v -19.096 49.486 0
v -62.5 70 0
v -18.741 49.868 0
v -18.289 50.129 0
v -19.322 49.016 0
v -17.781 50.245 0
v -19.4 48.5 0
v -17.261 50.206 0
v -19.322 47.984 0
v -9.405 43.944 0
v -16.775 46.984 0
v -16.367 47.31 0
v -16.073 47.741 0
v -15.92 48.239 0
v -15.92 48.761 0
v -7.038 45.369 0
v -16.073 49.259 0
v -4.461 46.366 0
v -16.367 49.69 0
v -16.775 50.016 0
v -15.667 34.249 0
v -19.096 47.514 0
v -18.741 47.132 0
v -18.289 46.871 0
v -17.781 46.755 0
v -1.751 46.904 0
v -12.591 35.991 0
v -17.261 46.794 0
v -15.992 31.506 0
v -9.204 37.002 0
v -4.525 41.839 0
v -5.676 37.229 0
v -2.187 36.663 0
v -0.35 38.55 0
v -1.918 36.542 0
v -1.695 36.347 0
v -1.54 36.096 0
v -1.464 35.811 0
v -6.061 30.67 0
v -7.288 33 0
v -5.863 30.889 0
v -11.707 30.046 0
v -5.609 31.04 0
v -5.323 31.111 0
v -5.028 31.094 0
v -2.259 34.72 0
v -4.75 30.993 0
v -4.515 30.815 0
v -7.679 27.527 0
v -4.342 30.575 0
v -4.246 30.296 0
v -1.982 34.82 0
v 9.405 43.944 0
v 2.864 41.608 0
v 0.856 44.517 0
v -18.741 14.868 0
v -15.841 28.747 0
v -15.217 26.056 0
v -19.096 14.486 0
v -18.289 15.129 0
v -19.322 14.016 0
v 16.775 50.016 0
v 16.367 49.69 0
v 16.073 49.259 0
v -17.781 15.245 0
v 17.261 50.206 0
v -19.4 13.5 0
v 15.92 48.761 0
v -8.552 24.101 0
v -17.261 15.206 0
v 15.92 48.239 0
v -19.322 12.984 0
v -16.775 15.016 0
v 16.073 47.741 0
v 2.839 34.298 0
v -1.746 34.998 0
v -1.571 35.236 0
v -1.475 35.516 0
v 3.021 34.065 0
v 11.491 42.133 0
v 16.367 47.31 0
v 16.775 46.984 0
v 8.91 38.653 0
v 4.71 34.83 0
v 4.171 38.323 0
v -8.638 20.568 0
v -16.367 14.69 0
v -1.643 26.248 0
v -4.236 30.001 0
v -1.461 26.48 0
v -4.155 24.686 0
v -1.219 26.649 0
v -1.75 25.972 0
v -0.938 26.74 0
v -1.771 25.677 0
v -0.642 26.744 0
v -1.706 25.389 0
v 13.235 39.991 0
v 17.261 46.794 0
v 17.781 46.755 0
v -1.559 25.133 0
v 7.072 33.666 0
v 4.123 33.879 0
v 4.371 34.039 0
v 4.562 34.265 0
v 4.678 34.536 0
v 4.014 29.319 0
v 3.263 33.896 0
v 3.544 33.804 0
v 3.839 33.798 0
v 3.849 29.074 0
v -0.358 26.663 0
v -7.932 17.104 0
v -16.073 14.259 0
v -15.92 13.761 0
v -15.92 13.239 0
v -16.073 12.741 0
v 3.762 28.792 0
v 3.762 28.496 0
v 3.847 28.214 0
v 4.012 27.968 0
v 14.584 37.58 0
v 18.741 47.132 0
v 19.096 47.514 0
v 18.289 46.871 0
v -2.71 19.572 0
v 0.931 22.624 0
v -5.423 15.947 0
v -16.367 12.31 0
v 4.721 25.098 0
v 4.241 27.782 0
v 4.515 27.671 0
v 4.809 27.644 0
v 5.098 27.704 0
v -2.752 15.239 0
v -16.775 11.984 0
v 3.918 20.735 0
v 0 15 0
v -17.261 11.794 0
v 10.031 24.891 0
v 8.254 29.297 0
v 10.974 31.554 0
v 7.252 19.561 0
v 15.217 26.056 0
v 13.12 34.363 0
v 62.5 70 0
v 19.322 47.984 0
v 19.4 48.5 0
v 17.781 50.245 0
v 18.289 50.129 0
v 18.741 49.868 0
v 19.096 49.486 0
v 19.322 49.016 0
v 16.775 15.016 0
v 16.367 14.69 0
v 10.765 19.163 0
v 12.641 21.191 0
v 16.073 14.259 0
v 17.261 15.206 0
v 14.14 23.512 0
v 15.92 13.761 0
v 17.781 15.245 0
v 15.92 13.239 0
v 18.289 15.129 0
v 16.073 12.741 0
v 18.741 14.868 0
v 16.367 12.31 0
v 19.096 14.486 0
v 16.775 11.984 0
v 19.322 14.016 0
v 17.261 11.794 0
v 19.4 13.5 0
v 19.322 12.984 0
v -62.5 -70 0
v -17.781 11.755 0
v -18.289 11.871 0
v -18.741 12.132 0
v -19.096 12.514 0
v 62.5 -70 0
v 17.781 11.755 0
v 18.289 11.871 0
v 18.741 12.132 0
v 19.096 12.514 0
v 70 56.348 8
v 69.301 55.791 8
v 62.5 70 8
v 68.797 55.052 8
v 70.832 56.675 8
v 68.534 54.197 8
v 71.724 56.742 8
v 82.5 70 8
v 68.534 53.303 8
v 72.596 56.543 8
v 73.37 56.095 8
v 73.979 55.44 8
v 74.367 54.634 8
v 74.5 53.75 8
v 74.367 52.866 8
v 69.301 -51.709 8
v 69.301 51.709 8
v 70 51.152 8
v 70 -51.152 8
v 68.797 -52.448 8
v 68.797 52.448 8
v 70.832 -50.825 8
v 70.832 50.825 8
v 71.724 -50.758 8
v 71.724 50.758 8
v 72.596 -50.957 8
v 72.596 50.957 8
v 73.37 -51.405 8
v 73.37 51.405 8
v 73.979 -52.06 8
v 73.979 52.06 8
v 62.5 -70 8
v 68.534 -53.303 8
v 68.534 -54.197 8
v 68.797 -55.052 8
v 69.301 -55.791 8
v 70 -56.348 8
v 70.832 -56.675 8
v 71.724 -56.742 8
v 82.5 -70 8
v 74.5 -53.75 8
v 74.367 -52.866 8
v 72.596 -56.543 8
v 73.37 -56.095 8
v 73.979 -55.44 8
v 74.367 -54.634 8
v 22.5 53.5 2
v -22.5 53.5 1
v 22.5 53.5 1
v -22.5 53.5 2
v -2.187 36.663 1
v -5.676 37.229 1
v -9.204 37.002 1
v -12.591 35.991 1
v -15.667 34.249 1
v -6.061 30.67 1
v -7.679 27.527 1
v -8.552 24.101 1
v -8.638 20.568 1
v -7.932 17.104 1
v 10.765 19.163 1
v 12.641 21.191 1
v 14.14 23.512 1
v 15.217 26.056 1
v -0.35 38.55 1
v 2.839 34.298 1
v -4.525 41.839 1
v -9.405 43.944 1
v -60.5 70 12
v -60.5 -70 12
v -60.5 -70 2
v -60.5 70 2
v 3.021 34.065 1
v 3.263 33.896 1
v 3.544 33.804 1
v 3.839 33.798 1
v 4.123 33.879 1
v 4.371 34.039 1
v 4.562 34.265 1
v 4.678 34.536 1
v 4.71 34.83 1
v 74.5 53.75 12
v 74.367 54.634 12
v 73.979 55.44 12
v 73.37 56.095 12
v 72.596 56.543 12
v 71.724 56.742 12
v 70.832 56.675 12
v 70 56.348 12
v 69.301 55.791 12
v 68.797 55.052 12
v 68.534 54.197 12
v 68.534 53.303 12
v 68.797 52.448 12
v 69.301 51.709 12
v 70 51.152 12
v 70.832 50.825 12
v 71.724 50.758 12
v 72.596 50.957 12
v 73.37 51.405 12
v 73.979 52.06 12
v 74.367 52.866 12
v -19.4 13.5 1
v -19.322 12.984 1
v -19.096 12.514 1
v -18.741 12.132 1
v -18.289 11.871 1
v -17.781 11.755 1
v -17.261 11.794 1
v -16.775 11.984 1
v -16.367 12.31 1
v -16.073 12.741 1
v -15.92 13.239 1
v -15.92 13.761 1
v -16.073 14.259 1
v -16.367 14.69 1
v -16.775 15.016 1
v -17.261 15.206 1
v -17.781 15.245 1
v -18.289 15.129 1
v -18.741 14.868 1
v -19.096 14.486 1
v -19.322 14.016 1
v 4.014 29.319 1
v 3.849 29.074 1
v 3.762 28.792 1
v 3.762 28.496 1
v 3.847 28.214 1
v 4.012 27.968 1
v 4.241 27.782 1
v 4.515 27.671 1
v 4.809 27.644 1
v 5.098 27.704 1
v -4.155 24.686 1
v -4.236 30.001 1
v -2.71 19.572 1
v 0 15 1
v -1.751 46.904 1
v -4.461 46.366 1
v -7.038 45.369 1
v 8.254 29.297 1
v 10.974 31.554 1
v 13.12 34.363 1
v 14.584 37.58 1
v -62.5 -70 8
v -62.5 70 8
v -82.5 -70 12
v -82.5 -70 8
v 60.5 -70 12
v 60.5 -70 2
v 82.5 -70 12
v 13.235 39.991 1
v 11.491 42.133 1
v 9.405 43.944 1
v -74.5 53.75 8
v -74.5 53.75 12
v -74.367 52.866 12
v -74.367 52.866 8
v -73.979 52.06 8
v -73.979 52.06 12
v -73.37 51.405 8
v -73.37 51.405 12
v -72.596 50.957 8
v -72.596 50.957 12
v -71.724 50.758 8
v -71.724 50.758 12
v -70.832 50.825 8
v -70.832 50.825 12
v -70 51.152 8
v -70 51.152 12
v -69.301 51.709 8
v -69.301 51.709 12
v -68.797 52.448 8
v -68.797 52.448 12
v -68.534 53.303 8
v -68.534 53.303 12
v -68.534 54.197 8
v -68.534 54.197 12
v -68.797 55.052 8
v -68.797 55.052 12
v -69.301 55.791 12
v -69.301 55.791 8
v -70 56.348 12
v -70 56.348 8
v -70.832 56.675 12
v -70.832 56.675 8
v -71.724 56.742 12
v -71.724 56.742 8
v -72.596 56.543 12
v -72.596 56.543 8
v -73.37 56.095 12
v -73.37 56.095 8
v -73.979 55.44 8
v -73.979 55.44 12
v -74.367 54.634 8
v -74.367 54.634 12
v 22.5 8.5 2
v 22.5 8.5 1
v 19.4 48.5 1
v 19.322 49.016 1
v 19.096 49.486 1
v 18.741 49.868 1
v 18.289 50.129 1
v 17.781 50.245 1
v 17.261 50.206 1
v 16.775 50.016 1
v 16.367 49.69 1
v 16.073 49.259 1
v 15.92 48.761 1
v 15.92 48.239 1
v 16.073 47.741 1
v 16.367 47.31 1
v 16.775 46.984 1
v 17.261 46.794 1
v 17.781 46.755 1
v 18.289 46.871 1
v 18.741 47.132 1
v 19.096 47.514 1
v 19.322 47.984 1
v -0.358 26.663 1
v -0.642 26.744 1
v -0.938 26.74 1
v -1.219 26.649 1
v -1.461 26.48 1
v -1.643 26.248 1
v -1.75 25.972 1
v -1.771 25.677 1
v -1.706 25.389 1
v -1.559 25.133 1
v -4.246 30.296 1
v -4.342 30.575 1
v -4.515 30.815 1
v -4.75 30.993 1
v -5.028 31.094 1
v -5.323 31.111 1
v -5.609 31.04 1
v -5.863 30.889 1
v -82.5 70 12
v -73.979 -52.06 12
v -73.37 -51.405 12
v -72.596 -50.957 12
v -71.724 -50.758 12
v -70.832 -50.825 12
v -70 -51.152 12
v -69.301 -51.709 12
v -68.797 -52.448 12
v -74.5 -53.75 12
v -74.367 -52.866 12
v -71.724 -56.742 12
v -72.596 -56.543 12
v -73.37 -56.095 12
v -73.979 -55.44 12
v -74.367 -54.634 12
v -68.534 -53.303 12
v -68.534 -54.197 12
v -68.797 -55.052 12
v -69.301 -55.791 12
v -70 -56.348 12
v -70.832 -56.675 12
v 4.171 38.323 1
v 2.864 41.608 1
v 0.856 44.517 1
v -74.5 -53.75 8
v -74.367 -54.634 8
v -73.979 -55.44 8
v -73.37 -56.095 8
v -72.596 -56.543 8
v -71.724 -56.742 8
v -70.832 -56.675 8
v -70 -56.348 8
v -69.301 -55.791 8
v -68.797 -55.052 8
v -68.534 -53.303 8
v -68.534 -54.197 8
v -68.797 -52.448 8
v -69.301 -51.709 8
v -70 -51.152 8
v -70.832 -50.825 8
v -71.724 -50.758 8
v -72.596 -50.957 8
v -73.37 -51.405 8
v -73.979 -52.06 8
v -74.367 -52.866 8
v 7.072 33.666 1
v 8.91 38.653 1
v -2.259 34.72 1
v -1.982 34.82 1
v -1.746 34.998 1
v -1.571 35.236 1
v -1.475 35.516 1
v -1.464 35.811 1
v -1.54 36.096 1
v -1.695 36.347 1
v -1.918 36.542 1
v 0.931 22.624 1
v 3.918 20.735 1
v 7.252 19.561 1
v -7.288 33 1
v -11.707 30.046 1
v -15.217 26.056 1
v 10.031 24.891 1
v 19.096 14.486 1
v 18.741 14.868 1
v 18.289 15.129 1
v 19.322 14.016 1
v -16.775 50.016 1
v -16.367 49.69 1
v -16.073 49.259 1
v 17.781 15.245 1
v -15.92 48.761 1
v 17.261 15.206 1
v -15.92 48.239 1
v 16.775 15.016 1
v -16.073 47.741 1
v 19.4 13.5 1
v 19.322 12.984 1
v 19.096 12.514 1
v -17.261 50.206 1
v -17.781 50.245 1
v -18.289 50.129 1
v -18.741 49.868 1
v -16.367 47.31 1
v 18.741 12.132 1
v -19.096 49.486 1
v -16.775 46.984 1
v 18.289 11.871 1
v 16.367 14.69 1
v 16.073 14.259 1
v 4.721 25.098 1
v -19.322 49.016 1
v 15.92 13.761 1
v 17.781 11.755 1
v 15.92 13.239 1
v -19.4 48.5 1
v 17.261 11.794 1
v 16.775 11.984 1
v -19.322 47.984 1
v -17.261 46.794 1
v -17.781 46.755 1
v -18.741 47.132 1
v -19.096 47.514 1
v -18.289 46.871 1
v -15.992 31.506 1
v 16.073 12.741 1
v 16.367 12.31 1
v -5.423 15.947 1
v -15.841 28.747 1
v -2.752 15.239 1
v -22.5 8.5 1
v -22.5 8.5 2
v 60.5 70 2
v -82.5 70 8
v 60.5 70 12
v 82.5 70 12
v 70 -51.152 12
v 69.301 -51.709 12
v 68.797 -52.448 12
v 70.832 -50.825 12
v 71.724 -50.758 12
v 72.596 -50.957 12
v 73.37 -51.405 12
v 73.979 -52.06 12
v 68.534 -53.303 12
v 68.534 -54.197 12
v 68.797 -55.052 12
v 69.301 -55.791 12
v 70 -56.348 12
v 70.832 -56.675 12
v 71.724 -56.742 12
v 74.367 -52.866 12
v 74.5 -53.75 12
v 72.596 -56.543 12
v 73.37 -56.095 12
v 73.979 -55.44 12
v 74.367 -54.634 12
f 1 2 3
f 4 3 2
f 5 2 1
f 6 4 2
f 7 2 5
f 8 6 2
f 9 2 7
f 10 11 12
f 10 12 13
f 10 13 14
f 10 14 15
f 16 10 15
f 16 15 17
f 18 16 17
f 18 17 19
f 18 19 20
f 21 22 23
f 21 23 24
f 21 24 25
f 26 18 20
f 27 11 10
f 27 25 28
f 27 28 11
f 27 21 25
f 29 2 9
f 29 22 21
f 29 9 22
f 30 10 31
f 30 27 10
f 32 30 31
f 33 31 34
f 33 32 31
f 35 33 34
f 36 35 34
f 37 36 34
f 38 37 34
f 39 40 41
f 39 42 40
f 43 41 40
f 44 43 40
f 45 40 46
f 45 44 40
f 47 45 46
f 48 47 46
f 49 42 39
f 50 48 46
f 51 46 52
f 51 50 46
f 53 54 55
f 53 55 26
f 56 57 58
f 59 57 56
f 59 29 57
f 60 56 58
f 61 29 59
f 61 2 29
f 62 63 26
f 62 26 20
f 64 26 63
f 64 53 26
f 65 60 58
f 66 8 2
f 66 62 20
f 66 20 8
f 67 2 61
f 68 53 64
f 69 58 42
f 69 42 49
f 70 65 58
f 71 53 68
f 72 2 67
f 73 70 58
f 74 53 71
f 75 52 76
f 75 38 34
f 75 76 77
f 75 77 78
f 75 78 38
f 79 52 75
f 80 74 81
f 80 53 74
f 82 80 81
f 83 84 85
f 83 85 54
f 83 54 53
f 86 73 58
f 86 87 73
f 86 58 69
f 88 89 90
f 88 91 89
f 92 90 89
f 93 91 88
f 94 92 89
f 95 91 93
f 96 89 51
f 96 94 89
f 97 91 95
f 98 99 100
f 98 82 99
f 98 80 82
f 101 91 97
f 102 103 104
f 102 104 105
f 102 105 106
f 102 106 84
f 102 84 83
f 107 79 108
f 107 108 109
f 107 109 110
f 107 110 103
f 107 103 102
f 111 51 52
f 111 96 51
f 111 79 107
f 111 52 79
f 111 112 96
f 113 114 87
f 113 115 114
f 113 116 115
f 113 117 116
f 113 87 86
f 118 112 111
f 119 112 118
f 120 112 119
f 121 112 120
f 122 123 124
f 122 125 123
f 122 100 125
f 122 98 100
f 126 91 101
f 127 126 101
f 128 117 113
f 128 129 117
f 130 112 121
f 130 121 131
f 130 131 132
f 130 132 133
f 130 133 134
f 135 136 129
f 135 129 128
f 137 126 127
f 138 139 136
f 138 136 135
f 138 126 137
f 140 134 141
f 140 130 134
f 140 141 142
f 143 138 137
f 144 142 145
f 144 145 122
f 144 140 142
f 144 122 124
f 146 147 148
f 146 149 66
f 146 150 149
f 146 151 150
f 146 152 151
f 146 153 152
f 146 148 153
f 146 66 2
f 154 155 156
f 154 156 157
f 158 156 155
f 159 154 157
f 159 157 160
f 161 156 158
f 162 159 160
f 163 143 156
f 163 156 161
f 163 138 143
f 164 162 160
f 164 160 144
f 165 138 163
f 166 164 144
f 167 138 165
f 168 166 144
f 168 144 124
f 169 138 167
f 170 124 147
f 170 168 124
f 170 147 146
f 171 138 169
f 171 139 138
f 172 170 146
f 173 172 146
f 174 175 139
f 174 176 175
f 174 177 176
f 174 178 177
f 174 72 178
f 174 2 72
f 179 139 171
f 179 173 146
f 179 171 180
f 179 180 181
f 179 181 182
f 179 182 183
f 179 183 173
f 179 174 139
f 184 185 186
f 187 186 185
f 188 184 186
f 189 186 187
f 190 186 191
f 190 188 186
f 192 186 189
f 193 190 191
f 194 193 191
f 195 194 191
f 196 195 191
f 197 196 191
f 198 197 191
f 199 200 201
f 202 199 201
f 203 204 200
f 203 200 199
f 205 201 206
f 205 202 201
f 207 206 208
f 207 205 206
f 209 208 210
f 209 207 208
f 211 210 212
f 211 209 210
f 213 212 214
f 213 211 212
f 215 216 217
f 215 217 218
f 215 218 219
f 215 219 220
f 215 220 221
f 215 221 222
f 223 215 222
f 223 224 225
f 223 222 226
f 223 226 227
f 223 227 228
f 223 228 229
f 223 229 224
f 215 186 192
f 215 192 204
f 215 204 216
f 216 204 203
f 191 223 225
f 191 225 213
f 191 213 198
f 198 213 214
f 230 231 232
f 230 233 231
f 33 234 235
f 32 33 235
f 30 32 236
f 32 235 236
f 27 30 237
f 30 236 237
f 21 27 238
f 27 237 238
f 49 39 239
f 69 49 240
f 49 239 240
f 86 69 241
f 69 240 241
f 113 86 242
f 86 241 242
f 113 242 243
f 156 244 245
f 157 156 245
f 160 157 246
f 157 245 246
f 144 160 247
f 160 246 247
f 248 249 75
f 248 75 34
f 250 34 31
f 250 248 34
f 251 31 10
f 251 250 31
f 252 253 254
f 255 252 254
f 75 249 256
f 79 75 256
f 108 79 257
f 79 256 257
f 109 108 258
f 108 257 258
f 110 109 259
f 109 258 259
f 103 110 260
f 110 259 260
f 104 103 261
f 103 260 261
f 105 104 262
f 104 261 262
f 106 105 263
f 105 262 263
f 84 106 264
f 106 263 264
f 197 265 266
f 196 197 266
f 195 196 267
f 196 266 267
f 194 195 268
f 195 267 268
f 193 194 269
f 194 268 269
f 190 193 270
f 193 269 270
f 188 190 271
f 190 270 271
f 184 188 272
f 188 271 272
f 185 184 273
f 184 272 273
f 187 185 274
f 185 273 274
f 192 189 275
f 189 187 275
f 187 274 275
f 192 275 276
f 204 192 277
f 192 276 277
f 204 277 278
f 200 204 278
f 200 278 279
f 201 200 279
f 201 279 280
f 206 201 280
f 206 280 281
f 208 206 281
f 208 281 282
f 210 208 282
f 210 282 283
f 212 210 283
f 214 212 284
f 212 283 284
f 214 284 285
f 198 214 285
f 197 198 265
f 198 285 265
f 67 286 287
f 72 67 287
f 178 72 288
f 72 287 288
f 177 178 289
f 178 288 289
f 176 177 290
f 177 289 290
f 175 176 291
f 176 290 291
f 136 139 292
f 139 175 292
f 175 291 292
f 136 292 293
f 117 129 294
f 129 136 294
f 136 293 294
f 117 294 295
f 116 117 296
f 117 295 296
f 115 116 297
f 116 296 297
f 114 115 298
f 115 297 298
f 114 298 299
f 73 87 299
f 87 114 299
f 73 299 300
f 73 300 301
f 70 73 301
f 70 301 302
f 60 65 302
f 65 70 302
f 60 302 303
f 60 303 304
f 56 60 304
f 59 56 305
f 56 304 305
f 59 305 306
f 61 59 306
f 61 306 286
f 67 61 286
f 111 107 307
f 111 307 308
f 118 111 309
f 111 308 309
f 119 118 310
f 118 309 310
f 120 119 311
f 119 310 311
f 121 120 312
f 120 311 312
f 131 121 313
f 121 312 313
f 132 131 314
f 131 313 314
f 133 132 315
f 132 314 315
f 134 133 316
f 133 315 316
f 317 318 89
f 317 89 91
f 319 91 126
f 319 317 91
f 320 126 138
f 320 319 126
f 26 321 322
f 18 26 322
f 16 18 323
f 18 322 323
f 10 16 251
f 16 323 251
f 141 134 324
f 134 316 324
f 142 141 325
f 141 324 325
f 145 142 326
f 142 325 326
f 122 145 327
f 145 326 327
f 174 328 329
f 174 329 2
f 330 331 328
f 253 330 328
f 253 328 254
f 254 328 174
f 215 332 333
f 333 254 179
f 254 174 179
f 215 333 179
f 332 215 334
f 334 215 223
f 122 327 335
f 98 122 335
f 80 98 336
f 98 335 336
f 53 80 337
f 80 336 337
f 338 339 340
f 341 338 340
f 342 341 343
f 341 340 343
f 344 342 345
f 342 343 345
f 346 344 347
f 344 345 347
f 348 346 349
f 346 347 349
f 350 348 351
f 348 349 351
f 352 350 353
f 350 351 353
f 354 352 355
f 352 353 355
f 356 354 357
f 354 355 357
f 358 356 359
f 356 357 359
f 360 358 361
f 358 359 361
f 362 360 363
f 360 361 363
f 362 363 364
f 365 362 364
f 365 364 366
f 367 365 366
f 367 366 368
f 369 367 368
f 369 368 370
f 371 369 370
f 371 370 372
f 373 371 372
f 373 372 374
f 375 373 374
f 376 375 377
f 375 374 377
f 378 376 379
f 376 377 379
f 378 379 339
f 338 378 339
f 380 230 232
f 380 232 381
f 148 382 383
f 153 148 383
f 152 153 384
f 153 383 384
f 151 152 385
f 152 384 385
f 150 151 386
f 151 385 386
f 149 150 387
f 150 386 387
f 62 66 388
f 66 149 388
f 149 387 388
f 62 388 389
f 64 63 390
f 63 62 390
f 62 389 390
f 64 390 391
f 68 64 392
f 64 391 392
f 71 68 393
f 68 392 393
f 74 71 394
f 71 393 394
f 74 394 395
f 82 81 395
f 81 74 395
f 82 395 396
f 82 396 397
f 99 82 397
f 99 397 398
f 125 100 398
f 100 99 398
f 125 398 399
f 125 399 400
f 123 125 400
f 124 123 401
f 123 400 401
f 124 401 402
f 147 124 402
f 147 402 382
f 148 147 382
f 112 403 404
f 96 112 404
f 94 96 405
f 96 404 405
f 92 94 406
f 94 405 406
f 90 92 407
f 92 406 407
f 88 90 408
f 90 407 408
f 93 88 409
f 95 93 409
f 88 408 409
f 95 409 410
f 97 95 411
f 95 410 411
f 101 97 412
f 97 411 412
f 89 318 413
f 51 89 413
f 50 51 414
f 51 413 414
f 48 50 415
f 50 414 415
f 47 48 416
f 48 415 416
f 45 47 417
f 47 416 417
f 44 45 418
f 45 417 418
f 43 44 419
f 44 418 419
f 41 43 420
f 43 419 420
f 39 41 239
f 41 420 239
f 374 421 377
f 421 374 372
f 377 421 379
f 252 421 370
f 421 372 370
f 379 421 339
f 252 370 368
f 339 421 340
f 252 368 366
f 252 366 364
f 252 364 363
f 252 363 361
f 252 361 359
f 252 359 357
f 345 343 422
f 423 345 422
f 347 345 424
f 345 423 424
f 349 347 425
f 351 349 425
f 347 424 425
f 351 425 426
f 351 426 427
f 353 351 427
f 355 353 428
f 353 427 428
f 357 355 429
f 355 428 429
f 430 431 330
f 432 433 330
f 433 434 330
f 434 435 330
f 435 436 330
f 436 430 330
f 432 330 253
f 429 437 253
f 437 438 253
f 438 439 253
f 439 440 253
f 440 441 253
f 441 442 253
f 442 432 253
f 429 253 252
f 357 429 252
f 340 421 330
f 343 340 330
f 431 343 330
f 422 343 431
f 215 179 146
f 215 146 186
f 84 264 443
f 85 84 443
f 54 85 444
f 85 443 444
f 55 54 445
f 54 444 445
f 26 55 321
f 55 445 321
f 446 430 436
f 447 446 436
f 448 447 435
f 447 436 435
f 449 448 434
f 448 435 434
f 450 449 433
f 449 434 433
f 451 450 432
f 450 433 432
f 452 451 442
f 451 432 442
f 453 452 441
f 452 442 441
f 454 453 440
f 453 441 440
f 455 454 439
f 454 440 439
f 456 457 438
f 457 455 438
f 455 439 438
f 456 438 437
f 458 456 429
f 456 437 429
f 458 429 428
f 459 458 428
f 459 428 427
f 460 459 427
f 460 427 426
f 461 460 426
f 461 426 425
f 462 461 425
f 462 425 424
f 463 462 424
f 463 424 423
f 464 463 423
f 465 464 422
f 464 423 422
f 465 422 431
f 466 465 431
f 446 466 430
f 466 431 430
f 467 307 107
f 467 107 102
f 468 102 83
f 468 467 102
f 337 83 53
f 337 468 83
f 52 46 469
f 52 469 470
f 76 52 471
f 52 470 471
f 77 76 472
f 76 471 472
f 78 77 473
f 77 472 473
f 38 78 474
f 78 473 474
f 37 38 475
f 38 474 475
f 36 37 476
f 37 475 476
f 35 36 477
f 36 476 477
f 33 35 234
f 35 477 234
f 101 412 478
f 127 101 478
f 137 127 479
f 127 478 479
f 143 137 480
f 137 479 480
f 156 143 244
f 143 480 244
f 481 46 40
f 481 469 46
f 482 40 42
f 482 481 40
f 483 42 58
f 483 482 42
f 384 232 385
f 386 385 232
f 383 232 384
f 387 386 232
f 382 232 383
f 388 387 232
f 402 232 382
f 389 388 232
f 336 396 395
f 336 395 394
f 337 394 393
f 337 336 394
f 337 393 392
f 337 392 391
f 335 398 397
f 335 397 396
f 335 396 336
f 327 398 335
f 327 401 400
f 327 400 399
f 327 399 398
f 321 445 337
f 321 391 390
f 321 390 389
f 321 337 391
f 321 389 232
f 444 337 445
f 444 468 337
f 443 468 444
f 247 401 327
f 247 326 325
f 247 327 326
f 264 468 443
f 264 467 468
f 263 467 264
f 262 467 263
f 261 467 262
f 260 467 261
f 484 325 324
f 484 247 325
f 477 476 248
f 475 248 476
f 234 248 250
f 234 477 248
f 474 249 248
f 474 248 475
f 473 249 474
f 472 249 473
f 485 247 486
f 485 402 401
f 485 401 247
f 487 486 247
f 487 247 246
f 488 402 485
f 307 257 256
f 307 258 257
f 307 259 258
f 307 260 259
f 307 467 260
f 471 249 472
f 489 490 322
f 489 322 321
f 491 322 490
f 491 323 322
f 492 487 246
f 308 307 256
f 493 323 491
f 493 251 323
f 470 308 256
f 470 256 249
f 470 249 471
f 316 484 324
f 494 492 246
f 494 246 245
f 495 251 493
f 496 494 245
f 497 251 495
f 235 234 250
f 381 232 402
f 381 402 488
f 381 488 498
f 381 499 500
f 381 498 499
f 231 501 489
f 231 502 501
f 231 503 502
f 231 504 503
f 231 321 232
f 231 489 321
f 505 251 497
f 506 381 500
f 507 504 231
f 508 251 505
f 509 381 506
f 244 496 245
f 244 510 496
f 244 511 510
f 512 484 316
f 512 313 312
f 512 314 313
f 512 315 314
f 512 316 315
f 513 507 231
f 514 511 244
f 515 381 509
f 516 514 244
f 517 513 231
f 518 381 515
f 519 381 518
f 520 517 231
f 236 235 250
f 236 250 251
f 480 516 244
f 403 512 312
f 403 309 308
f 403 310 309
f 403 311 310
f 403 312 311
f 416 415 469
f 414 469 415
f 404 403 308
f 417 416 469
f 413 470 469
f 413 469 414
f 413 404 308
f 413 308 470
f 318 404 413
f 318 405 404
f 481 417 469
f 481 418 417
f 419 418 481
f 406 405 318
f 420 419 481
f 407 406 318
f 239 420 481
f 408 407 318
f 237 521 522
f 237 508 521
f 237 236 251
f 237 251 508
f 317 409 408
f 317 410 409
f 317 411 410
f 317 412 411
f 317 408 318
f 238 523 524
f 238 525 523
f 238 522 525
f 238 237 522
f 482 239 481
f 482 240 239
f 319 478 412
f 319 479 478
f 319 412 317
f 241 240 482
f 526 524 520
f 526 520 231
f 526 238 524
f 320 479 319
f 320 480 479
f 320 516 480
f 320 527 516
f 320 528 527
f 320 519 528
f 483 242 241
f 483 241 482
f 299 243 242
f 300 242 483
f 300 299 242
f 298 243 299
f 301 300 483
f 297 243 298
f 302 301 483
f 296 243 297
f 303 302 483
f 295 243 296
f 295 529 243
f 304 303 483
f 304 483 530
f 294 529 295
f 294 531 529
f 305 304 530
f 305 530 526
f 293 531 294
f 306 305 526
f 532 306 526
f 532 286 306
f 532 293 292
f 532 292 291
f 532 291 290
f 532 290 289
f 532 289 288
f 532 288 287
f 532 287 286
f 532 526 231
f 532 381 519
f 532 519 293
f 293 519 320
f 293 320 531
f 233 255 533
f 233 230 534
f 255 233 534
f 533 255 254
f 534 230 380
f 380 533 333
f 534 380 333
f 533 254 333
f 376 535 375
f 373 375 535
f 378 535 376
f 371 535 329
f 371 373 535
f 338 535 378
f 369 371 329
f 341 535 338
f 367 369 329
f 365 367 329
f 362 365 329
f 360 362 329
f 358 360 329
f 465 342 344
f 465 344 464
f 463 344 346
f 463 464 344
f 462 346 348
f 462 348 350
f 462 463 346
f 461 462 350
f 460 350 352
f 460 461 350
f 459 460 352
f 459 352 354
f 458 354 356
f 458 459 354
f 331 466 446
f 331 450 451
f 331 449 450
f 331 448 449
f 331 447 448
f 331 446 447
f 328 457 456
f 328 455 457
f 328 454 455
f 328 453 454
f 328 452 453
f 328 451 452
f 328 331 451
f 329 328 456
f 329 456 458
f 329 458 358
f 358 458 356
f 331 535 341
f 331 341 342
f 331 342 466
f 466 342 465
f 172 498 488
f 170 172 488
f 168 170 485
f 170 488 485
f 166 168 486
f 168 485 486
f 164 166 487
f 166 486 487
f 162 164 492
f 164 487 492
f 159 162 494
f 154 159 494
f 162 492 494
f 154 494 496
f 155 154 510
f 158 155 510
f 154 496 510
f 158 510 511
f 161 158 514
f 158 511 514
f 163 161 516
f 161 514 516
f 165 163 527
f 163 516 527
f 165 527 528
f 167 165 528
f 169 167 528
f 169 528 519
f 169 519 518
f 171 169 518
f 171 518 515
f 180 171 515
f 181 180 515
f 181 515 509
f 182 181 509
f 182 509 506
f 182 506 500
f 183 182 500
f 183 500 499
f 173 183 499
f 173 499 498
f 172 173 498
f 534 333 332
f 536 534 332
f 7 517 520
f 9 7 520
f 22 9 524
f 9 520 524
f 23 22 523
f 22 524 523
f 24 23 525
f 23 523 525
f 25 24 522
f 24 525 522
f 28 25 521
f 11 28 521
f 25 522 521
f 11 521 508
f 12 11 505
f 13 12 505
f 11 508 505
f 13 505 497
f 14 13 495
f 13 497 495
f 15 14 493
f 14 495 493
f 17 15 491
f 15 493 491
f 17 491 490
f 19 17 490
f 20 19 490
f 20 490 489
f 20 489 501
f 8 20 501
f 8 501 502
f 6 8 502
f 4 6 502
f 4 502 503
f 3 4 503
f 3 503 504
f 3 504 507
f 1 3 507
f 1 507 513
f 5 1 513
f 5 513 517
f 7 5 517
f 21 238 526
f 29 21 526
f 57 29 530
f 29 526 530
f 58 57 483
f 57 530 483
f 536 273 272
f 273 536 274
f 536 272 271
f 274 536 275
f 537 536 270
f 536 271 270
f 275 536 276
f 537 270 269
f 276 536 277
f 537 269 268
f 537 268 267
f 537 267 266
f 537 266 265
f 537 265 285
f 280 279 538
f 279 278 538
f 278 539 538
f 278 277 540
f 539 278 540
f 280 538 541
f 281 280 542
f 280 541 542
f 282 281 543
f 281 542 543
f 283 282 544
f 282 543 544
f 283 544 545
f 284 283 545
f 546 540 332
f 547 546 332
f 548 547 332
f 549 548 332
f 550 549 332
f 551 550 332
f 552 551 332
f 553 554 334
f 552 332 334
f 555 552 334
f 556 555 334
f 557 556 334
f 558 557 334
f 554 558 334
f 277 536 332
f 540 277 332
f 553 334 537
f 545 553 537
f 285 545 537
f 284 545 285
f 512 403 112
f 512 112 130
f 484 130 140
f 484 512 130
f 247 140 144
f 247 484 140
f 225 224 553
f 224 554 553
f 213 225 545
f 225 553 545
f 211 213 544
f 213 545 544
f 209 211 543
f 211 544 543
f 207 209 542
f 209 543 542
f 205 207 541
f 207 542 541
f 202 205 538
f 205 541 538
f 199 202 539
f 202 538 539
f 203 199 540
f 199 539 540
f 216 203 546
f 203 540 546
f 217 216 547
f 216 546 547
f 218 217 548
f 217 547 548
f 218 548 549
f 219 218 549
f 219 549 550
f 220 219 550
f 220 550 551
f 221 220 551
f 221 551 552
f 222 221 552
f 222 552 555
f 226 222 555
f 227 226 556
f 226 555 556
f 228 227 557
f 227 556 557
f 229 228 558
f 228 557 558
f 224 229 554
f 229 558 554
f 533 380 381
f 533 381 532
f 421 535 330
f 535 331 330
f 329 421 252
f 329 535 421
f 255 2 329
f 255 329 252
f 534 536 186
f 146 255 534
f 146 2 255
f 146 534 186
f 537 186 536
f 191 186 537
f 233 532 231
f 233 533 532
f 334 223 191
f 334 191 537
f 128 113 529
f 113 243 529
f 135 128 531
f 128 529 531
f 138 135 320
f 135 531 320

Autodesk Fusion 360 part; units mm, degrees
sketch "extrusion" plane through (0, 0, 0) normal (0, 1, 0) x (1, 0, 0)
  line L0 (-82.5, -8) -> (-62.5, -8)
  line L1 (-62.5, -8) -> (-62.5, 0)
  line L2 (-62.5, 0) -> (62.5, 0)
  line L3 (62.5, 0) -> (62.5, -8)
  line L4 (62.5, -8) -> (82.5, -8)
  line L5 (-60.5, -12) -> (-60.5, -2)
  line L6 (-60.5, -2) -> (60.5, -2)
  line L7 (60.5, -2) -> (60.5, -12)
  line L8 (-82.5, -12) -> (-60.5, -12)
  line L9 (60.5, -12) -> (82.5, -12)
  line L10 (-82.5, -8) -> (-82.5, -12)
  line L11 (82.5, -8) -> (82.5, -12)
  dimension "d1" = 125
  dimension "d2" = 8
  dimension "d3" = 20
  dimension "d4" = 8
  dimension "d5" = 20
extrude "Extrude1" add sketch "extrusion" along normal mid plane 140
sketch "top holes" plane through (0, 0, 12) normal (0, 0, 1) x (-1, 0, 0)
  circle A0 centre (71.5, -53.75) radius 3
  line L0 (82.5, -70) -> (60.5, -70)
  dimension "d11" = 6
  dimension "d12" = 16.25
extrude "Extrude2" cut sketch "top holes" against normal blind 4
mirror "Mirror1" about plane through (0, 0, 0) normal (1, 0, 0) of "Extrude2"
mirror "Mirror2" about plane through (0, 0, 0) normal (0, 1, 0) of "Extrude2", "Mirror1"
sketch "square undent" plane through (0, 0, 2) normal (0, 0, 1) x (-1, 0, 0)
  line L0 (22.5, -53.5) -> (-22.5, -53.5)
  line L1 (-22.5, -53.5) -> (-22.5, -8.5)
  line L2 (-22.5, -8.5) -> (22.5, -8.5)
  line L3 (22.5, -8.5) -> (22.5, -53.5)
  line L4 (60.5, -70) -> (-60.5, -70)
  dimension "d17" = 45
  dimension "d18" = 45
  dimension "d19" = 16.5
extrude "Extrude3" cut sketch "square undent" against normal blind 1
sketch "square holes" plane through (0, 0, 1) normal (0, 0, 1) x (-1, 0, 0)
  circle A0 centre (17.65, -48.5) radius 1.75
  line L0 (22.5, -53.5) -> (-22.5, -53.5)
  line L1 (22.5, -8.5) -> (22.5, -53.5)
  line L2 (-22.5, -8.5) -> (22.5, -53.5) construction
  circle A1 centre (0, -31) radius 16
  arc A2 (4.2359, -30.0006) -> (0, -15) centre (-16.1329, -27.654) ccw
  arc A3 (6.0614, -30.6697) -> (7.9315, -17.1043) centre (-7.0111, -21.9559) ccw
  arc A4 (4.2359, -30.0006) -> (6.0614, -30.6697) centre (5.2293, -30.115) ccw
  dimension "d22" = 3.5
  dimension "d23" = 5
  dimension "d24" = 4.85
  dimension "d25" = 32
  dimension "d26" = 1
extrude "Extrude4" cut sketch "square holes" against normal blind 1 contours A0
ref_plane "WorkPlane1" through (0, 31, 1.5) normal (0, -1, 0) x (-1, 0, 0)
mirror "Mirror3" about plane through (0, 31, 1.5) normal (0, -1, 0) of "Extrude4"
mirror "Mirror4" about plane through (0, 0, 0) normal (1, 0, 0) of "Extrude4", "Mirror3"
extrude "Extrude5" cut sketch "square holes" against normal blind 1 contours A1 A2 A3 A4 picked at (5.7365, -18.2771)
pattern_circular "C-Pattern1" count 5 over 360 about axis through (0, 31, 1) along (0, 0, -1) of "Extrude5"
